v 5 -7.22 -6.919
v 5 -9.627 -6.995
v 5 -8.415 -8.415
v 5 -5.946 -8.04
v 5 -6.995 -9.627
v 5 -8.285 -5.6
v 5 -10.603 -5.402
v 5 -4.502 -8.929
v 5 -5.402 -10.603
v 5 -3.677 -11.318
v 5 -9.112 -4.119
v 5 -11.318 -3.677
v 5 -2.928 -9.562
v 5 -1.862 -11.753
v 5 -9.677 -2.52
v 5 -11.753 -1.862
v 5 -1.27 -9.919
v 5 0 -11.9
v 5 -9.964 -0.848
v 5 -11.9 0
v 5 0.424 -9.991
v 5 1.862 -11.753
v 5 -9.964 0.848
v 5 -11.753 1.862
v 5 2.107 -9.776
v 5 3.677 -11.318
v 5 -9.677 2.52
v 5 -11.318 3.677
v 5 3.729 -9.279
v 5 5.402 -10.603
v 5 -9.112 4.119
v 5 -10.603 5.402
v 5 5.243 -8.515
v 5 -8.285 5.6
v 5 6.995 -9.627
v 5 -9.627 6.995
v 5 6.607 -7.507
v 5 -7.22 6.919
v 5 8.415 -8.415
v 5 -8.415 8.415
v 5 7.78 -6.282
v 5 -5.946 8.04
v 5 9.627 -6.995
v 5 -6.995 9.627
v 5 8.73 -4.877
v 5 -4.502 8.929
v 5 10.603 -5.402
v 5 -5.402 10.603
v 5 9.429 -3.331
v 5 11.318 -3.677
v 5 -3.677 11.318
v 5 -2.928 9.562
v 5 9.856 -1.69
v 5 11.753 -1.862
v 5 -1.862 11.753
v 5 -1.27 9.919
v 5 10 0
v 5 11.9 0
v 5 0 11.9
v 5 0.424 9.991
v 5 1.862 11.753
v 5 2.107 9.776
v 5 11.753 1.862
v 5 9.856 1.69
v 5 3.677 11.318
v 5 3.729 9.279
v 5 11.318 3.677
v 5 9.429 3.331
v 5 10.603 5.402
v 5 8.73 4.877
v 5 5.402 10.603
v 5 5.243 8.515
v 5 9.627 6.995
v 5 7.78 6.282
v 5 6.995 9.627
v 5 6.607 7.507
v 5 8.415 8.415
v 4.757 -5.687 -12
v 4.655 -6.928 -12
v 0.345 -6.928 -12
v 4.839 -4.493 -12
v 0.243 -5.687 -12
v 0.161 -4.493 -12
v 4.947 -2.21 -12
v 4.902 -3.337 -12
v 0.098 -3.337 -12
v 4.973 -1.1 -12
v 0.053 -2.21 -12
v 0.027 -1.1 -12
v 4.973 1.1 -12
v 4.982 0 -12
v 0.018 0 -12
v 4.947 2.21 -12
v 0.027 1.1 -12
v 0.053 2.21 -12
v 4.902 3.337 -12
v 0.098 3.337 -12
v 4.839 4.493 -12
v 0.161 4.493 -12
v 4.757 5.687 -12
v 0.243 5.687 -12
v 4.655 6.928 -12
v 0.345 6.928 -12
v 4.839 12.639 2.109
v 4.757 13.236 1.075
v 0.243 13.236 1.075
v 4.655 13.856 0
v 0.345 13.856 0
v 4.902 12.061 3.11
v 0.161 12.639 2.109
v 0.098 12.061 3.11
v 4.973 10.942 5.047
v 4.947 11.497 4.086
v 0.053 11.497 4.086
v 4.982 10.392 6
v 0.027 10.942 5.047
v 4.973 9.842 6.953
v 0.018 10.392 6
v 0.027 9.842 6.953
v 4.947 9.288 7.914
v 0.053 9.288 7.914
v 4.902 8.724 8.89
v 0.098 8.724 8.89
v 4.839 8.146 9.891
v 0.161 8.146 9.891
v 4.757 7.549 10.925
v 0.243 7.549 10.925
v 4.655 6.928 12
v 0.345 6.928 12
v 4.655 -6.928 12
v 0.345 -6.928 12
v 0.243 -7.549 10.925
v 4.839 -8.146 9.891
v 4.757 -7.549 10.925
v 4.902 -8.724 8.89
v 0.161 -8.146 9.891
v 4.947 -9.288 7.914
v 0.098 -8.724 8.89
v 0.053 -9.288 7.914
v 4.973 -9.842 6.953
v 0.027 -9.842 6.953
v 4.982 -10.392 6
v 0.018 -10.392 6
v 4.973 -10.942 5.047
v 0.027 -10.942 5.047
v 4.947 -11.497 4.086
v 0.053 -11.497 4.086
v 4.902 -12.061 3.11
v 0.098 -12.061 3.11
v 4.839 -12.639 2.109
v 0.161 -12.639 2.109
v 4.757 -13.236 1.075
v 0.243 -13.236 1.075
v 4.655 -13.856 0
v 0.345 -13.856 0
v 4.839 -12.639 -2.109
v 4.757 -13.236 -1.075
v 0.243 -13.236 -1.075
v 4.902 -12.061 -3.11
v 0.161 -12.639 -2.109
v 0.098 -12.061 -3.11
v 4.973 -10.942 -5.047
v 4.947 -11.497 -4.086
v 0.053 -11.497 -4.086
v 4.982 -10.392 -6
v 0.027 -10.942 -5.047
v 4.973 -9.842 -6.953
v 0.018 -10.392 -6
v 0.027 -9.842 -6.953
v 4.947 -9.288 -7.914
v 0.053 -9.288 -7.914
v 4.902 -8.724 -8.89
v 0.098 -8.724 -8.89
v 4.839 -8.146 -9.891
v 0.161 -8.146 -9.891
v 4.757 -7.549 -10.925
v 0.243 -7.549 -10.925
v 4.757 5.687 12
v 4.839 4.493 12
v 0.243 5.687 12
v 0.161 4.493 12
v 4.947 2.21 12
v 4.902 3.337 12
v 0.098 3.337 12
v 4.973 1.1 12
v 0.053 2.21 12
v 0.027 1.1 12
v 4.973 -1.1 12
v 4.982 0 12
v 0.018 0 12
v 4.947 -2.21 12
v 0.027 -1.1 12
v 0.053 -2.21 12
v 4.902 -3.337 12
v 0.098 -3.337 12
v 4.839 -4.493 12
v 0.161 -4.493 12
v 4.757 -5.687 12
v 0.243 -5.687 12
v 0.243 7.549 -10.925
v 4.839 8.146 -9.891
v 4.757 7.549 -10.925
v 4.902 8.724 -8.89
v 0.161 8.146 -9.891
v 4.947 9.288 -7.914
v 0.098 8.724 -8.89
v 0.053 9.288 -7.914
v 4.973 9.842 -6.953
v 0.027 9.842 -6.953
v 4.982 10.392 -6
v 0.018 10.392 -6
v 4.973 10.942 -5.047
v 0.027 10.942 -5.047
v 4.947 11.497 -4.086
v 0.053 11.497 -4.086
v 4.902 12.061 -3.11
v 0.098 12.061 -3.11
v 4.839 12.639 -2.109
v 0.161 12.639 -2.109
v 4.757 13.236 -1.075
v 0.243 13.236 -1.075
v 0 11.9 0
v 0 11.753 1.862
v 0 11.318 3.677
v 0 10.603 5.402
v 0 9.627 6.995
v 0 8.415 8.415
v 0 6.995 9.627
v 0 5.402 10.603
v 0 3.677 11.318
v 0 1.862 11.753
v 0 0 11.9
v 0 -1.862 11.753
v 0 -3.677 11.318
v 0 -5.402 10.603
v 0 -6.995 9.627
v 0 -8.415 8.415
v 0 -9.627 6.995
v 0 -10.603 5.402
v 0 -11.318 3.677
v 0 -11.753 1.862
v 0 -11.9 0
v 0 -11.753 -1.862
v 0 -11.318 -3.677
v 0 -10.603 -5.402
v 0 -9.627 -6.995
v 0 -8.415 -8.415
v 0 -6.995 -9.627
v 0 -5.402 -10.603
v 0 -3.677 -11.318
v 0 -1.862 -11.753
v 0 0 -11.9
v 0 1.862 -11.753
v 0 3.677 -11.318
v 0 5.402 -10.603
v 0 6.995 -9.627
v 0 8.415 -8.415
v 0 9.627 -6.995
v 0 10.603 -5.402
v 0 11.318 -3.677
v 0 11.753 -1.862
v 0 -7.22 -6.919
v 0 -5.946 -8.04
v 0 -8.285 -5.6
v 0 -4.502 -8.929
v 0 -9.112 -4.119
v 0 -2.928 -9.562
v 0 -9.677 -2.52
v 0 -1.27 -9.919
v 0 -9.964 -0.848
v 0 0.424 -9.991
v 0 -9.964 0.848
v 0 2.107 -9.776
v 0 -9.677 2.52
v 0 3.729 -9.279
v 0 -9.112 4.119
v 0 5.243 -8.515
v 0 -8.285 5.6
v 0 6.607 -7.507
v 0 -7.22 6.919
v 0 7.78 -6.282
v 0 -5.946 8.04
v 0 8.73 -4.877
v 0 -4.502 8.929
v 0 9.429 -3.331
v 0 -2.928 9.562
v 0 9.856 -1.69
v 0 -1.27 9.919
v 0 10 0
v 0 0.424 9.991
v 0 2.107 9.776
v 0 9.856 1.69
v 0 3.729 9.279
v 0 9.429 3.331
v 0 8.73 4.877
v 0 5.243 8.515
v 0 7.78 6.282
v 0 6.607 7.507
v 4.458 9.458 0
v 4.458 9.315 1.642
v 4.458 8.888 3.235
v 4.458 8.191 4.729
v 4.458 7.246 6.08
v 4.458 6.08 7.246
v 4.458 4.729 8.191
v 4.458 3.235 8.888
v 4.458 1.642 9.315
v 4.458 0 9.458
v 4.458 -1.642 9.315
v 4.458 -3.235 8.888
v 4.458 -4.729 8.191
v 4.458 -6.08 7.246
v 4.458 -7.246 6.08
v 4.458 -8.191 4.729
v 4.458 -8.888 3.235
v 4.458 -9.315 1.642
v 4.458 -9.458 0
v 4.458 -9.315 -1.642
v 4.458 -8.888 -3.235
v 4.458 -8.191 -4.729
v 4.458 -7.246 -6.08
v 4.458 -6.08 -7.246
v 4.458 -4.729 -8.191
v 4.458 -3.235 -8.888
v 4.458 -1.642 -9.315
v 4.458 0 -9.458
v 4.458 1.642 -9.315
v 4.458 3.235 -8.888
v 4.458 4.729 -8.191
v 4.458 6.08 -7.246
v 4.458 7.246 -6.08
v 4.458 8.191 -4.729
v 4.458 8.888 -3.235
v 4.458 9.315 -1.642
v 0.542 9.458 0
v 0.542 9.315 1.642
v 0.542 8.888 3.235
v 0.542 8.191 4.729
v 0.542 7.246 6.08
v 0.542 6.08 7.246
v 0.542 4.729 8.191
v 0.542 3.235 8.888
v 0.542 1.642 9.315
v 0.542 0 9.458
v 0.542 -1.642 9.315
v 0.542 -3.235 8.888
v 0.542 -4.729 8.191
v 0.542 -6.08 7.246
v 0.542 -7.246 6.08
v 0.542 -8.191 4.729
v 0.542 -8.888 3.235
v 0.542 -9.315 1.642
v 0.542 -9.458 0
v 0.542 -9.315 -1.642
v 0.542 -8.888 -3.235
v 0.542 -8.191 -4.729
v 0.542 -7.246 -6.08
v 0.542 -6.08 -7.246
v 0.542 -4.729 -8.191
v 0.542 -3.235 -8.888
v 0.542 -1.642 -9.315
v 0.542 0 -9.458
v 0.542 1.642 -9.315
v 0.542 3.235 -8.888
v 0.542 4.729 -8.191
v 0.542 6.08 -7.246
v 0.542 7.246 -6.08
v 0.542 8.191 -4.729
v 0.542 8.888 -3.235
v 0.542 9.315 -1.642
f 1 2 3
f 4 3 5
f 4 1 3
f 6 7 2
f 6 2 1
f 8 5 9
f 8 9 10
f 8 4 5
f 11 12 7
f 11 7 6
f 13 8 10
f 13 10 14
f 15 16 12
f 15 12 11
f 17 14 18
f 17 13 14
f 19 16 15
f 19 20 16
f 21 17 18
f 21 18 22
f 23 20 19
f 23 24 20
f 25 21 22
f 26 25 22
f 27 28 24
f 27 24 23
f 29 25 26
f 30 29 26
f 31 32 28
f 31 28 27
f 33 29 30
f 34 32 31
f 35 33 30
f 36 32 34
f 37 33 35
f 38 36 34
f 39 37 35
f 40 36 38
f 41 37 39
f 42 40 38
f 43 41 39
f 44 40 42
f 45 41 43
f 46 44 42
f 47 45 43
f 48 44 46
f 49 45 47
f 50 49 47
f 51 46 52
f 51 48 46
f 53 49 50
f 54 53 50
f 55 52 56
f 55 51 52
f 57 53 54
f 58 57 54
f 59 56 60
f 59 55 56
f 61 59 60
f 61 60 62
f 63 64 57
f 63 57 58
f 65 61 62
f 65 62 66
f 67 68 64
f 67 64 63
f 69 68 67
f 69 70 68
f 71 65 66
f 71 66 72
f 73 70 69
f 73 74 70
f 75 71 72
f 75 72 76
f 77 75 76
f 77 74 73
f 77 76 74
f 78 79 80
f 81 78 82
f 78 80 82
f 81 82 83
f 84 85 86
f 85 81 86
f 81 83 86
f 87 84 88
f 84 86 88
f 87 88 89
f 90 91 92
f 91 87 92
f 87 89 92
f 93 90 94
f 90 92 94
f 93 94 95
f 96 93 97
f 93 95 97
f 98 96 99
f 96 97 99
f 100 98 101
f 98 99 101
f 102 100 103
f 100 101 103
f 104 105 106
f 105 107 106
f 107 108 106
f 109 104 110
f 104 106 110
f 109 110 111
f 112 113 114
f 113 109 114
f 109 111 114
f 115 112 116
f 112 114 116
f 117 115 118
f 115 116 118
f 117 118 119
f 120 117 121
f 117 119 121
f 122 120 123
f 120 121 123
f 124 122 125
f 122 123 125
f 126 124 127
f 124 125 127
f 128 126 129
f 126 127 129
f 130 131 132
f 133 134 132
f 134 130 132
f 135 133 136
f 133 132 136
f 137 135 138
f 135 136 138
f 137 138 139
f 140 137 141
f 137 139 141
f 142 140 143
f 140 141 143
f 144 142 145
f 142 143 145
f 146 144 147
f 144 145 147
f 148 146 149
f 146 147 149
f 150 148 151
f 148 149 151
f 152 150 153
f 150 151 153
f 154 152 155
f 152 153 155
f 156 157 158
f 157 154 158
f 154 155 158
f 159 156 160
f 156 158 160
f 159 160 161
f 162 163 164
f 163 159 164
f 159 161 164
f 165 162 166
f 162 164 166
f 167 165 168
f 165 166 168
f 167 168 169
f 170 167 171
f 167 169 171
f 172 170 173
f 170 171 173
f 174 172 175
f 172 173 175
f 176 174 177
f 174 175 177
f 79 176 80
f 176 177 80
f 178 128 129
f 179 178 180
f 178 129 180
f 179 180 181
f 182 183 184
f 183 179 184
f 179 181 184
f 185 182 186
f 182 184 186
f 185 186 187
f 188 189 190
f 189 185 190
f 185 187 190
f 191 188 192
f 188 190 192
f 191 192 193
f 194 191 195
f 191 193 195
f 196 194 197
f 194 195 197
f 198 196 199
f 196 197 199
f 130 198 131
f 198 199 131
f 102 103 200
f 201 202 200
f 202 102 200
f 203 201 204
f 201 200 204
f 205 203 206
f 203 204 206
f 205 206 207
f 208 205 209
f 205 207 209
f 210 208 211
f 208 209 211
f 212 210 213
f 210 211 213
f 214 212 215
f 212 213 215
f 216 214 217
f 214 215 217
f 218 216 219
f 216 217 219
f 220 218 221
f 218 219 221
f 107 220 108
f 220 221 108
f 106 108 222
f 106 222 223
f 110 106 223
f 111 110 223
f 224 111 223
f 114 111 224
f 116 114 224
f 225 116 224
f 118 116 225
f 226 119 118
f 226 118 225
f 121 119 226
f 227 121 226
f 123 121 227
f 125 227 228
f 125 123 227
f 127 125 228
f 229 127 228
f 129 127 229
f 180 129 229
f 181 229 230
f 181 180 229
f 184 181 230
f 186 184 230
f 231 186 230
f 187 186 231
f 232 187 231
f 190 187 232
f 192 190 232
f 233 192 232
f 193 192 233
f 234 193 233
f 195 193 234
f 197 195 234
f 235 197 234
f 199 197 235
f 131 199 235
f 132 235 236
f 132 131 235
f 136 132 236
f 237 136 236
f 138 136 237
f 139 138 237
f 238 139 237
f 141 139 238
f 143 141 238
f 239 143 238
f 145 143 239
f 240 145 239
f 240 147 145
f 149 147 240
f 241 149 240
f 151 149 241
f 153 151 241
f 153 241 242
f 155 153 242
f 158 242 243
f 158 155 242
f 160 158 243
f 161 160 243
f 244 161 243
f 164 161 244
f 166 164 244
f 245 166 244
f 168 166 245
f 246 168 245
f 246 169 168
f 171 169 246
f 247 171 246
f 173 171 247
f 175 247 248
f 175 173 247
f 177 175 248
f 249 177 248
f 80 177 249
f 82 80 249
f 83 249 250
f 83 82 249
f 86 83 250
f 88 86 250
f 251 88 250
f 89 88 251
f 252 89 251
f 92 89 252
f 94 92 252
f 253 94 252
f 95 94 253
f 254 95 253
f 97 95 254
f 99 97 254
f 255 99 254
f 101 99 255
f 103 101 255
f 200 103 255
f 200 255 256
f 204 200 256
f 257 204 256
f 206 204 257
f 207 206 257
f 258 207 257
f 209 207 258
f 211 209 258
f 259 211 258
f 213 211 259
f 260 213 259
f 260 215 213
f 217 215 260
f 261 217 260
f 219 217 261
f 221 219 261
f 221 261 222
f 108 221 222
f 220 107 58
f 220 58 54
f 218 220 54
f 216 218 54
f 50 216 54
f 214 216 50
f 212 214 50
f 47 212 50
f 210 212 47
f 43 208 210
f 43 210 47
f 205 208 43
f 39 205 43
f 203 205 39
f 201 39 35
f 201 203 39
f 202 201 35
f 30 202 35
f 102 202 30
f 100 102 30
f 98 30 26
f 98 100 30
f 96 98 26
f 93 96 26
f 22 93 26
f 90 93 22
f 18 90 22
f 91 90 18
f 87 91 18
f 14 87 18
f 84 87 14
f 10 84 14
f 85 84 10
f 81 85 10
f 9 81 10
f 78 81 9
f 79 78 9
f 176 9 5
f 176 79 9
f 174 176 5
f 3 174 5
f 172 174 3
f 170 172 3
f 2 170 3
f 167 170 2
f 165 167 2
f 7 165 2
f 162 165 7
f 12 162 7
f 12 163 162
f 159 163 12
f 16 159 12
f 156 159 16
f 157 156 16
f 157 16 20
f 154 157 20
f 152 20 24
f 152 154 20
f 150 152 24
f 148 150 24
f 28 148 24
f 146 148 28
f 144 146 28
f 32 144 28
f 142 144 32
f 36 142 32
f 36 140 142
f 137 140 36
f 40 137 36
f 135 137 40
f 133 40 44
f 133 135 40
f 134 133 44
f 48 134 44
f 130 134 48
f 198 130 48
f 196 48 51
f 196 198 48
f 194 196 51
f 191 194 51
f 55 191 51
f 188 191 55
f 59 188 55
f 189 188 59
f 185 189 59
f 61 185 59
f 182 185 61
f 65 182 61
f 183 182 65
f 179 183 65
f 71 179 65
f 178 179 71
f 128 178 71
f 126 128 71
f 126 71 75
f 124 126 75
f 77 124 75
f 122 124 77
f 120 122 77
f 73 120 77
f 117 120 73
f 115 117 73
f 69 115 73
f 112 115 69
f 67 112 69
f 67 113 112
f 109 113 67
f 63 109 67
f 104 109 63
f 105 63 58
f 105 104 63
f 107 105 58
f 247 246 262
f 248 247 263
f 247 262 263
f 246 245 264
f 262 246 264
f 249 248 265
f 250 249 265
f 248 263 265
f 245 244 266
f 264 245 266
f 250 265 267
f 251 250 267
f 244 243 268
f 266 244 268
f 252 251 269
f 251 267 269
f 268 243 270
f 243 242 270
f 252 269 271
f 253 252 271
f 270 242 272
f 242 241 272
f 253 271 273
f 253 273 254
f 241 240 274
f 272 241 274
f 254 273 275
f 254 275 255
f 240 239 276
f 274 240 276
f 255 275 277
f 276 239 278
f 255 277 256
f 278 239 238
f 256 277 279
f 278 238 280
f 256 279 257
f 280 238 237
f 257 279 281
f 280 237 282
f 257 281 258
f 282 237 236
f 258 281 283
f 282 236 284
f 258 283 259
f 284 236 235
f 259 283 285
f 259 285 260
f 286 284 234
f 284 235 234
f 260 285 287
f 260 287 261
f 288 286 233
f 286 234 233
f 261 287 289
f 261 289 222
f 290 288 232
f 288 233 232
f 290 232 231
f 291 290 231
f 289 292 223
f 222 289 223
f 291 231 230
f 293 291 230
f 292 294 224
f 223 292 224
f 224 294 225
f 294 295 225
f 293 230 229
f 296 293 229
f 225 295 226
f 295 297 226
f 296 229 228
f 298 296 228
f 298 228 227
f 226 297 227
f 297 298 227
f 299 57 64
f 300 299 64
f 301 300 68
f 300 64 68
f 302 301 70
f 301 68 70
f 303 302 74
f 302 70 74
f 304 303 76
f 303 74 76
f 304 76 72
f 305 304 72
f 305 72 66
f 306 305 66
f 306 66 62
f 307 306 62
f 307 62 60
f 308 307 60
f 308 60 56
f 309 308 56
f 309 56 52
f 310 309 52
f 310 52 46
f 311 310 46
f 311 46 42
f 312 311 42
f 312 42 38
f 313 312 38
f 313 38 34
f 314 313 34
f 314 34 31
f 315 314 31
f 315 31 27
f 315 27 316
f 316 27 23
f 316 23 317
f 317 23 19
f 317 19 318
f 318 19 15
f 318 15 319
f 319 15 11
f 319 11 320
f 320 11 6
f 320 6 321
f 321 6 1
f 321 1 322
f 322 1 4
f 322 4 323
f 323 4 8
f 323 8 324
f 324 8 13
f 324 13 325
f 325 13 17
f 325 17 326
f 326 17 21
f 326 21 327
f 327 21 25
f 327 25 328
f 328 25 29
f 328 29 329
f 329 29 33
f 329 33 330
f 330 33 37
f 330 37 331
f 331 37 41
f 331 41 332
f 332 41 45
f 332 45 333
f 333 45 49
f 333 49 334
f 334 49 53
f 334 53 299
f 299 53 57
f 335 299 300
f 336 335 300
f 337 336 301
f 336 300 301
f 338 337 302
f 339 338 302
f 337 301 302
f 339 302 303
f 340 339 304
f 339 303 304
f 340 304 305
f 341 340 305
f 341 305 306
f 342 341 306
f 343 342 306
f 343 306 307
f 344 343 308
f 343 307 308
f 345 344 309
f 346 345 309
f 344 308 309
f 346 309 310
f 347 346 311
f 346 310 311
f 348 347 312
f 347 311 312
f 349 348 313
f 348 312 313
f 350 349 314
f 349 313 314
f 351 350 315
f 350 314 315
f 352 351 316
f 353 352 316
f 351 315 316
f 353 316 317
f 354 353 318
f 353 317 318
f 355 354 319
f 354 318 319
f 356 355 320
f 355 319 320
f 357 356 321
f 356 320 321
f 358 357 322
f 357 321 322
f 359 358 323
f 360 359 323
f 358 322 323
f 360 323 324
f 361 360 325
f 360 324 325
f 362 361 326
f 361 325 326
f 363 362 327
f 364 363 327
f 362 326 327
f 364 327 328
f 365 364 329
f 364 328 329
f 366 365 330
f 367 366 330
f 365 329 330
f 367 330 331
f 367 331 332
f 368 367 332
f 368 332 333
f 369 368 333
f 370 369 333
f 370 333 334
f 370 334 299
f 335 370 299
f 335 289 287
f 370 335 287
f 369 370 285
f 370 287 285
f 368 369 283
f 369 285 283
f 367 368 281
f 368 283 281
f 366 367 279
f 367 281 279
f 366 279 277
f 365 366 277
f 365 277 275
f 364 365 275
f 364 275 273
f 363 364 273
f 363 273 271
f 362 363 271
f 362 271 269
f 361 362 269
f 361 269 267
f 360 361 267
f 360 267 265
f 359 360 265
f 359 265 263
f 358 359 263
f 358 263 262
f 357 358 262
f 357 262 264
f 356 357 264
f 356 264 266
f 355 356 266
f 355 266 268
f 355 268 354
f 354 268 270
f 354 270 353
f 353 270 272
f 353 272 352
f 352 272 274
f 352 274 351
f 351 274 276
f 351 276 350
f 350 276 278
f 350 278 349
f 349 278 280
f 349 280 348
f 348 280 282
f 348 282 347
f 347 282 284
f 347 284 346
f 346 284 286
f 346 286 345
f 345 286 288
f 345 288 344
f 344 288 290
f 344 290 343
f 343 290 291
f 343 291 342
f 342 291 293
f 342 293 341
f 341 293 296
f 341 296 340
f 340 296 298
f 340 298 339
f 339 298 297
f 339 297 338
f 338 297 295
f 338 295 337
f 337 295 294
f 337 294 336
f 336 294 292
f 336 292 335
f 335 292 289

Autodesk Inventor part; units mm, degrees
sketch "Skizze_1" plane through (0, 0, 0) normal (0, 0, 1) x (1, 0, 0)
  line L0 (5, 0) -> (0, 0)
  line L1 (0, 0) -> (0, 11.9)
  line L2 (0, 11.9) -> (0.864, 16.8)
  line L3 (0.864, 16.8) -> (4.136, 16.8)
  line L4 (4.136, 16.8) -> (5, 11.9)
  line L5 (5, 11.9) -> (5, 0)
  line L6 (5, 0) -> (0, 0)
revolve "Revolution1" add sketch "Skizze_1" angle 360 about axis through (5, 0, 0) along (1, 0, 0)
sketch "Skizze_3" plane through (0, 0, 0) normal (0, 0, 1) x (1, 0, 0)
  line L0 (5, 0) -> (0, 0)
  line L1 (0, 0) -> (0, 10)
  line L2 (0, 10) -> (0.5415, 9.4585)
  line L3 (0.5415, 9.4585) -> (4.4585, 9.4585)
  line L4 (4.4585, 9.4585) -> (5, 10)
  line L5 (5, 10) -> (5, 0)
  line L6 (5, 0) -> (0, 0)
revolve "Revolution2" cut sketch "Skizze_3" angle 360 about axis through (5, 0, 0) along (1, 0, 0)
thread "Thread1" size "M20x1" class "6H" standard "ISO Metric profile" full length
sketch "Sketch_1" plane through (0, 0, 0) normal (1, 0, 0) x (0, 1, 0)
  line L0 (24, 24) -> (-24, 24)
  line L1 (-24, 24) -> (-24, -24)
  line L2 (-24, -24) -> (24, -24)
  line L3 (24, -24) -> (24, 24)
  line L4 (-6.9282, 12) -> (-13.8564, 0)
  line L5 (-13.8564, 0) -> (-6.9282, -12)
  line L6 (-6.9282, -12) -> (6.9282, -12)
  line L7 (6.9282, -12) -> (13.8564, 0)
  line L8 (13.8564, 0) -> (6.9282, 12)
  line L9 (6.9282, 12) -> (-6.9282, 12)
extrude "Extrusion1" cut sketch "Sketch_1" along normal blind 5
ref_plane "ANBAU_XY" through (0, 0, 0) normal (1, 0, 0) x (0, 0, -1)
ref_plane "ANBAU_YZ" through (0, 0, 0) normal (0, 0, -1) x (0, 1, 0)
ref_plane "ANBAU_ZX" through (0, 0, 0) normal (0, 1, 0) x (1, 0, 0)
ref_plane "SLE_XY" through (5, 0, 0) normal (-1, 0, 0) x (0, 1, 0)
ref_plane "SLE_YZ" through (5, 0, 0) normal (0, 1, 0) x (0, 0, -1)
ref_plane "SLE_ZX" through (5, 0, 0) normal (0, 0, -1) x (-1, 0, 0)
properties part number "Flachmutter M20x1-5-24"
